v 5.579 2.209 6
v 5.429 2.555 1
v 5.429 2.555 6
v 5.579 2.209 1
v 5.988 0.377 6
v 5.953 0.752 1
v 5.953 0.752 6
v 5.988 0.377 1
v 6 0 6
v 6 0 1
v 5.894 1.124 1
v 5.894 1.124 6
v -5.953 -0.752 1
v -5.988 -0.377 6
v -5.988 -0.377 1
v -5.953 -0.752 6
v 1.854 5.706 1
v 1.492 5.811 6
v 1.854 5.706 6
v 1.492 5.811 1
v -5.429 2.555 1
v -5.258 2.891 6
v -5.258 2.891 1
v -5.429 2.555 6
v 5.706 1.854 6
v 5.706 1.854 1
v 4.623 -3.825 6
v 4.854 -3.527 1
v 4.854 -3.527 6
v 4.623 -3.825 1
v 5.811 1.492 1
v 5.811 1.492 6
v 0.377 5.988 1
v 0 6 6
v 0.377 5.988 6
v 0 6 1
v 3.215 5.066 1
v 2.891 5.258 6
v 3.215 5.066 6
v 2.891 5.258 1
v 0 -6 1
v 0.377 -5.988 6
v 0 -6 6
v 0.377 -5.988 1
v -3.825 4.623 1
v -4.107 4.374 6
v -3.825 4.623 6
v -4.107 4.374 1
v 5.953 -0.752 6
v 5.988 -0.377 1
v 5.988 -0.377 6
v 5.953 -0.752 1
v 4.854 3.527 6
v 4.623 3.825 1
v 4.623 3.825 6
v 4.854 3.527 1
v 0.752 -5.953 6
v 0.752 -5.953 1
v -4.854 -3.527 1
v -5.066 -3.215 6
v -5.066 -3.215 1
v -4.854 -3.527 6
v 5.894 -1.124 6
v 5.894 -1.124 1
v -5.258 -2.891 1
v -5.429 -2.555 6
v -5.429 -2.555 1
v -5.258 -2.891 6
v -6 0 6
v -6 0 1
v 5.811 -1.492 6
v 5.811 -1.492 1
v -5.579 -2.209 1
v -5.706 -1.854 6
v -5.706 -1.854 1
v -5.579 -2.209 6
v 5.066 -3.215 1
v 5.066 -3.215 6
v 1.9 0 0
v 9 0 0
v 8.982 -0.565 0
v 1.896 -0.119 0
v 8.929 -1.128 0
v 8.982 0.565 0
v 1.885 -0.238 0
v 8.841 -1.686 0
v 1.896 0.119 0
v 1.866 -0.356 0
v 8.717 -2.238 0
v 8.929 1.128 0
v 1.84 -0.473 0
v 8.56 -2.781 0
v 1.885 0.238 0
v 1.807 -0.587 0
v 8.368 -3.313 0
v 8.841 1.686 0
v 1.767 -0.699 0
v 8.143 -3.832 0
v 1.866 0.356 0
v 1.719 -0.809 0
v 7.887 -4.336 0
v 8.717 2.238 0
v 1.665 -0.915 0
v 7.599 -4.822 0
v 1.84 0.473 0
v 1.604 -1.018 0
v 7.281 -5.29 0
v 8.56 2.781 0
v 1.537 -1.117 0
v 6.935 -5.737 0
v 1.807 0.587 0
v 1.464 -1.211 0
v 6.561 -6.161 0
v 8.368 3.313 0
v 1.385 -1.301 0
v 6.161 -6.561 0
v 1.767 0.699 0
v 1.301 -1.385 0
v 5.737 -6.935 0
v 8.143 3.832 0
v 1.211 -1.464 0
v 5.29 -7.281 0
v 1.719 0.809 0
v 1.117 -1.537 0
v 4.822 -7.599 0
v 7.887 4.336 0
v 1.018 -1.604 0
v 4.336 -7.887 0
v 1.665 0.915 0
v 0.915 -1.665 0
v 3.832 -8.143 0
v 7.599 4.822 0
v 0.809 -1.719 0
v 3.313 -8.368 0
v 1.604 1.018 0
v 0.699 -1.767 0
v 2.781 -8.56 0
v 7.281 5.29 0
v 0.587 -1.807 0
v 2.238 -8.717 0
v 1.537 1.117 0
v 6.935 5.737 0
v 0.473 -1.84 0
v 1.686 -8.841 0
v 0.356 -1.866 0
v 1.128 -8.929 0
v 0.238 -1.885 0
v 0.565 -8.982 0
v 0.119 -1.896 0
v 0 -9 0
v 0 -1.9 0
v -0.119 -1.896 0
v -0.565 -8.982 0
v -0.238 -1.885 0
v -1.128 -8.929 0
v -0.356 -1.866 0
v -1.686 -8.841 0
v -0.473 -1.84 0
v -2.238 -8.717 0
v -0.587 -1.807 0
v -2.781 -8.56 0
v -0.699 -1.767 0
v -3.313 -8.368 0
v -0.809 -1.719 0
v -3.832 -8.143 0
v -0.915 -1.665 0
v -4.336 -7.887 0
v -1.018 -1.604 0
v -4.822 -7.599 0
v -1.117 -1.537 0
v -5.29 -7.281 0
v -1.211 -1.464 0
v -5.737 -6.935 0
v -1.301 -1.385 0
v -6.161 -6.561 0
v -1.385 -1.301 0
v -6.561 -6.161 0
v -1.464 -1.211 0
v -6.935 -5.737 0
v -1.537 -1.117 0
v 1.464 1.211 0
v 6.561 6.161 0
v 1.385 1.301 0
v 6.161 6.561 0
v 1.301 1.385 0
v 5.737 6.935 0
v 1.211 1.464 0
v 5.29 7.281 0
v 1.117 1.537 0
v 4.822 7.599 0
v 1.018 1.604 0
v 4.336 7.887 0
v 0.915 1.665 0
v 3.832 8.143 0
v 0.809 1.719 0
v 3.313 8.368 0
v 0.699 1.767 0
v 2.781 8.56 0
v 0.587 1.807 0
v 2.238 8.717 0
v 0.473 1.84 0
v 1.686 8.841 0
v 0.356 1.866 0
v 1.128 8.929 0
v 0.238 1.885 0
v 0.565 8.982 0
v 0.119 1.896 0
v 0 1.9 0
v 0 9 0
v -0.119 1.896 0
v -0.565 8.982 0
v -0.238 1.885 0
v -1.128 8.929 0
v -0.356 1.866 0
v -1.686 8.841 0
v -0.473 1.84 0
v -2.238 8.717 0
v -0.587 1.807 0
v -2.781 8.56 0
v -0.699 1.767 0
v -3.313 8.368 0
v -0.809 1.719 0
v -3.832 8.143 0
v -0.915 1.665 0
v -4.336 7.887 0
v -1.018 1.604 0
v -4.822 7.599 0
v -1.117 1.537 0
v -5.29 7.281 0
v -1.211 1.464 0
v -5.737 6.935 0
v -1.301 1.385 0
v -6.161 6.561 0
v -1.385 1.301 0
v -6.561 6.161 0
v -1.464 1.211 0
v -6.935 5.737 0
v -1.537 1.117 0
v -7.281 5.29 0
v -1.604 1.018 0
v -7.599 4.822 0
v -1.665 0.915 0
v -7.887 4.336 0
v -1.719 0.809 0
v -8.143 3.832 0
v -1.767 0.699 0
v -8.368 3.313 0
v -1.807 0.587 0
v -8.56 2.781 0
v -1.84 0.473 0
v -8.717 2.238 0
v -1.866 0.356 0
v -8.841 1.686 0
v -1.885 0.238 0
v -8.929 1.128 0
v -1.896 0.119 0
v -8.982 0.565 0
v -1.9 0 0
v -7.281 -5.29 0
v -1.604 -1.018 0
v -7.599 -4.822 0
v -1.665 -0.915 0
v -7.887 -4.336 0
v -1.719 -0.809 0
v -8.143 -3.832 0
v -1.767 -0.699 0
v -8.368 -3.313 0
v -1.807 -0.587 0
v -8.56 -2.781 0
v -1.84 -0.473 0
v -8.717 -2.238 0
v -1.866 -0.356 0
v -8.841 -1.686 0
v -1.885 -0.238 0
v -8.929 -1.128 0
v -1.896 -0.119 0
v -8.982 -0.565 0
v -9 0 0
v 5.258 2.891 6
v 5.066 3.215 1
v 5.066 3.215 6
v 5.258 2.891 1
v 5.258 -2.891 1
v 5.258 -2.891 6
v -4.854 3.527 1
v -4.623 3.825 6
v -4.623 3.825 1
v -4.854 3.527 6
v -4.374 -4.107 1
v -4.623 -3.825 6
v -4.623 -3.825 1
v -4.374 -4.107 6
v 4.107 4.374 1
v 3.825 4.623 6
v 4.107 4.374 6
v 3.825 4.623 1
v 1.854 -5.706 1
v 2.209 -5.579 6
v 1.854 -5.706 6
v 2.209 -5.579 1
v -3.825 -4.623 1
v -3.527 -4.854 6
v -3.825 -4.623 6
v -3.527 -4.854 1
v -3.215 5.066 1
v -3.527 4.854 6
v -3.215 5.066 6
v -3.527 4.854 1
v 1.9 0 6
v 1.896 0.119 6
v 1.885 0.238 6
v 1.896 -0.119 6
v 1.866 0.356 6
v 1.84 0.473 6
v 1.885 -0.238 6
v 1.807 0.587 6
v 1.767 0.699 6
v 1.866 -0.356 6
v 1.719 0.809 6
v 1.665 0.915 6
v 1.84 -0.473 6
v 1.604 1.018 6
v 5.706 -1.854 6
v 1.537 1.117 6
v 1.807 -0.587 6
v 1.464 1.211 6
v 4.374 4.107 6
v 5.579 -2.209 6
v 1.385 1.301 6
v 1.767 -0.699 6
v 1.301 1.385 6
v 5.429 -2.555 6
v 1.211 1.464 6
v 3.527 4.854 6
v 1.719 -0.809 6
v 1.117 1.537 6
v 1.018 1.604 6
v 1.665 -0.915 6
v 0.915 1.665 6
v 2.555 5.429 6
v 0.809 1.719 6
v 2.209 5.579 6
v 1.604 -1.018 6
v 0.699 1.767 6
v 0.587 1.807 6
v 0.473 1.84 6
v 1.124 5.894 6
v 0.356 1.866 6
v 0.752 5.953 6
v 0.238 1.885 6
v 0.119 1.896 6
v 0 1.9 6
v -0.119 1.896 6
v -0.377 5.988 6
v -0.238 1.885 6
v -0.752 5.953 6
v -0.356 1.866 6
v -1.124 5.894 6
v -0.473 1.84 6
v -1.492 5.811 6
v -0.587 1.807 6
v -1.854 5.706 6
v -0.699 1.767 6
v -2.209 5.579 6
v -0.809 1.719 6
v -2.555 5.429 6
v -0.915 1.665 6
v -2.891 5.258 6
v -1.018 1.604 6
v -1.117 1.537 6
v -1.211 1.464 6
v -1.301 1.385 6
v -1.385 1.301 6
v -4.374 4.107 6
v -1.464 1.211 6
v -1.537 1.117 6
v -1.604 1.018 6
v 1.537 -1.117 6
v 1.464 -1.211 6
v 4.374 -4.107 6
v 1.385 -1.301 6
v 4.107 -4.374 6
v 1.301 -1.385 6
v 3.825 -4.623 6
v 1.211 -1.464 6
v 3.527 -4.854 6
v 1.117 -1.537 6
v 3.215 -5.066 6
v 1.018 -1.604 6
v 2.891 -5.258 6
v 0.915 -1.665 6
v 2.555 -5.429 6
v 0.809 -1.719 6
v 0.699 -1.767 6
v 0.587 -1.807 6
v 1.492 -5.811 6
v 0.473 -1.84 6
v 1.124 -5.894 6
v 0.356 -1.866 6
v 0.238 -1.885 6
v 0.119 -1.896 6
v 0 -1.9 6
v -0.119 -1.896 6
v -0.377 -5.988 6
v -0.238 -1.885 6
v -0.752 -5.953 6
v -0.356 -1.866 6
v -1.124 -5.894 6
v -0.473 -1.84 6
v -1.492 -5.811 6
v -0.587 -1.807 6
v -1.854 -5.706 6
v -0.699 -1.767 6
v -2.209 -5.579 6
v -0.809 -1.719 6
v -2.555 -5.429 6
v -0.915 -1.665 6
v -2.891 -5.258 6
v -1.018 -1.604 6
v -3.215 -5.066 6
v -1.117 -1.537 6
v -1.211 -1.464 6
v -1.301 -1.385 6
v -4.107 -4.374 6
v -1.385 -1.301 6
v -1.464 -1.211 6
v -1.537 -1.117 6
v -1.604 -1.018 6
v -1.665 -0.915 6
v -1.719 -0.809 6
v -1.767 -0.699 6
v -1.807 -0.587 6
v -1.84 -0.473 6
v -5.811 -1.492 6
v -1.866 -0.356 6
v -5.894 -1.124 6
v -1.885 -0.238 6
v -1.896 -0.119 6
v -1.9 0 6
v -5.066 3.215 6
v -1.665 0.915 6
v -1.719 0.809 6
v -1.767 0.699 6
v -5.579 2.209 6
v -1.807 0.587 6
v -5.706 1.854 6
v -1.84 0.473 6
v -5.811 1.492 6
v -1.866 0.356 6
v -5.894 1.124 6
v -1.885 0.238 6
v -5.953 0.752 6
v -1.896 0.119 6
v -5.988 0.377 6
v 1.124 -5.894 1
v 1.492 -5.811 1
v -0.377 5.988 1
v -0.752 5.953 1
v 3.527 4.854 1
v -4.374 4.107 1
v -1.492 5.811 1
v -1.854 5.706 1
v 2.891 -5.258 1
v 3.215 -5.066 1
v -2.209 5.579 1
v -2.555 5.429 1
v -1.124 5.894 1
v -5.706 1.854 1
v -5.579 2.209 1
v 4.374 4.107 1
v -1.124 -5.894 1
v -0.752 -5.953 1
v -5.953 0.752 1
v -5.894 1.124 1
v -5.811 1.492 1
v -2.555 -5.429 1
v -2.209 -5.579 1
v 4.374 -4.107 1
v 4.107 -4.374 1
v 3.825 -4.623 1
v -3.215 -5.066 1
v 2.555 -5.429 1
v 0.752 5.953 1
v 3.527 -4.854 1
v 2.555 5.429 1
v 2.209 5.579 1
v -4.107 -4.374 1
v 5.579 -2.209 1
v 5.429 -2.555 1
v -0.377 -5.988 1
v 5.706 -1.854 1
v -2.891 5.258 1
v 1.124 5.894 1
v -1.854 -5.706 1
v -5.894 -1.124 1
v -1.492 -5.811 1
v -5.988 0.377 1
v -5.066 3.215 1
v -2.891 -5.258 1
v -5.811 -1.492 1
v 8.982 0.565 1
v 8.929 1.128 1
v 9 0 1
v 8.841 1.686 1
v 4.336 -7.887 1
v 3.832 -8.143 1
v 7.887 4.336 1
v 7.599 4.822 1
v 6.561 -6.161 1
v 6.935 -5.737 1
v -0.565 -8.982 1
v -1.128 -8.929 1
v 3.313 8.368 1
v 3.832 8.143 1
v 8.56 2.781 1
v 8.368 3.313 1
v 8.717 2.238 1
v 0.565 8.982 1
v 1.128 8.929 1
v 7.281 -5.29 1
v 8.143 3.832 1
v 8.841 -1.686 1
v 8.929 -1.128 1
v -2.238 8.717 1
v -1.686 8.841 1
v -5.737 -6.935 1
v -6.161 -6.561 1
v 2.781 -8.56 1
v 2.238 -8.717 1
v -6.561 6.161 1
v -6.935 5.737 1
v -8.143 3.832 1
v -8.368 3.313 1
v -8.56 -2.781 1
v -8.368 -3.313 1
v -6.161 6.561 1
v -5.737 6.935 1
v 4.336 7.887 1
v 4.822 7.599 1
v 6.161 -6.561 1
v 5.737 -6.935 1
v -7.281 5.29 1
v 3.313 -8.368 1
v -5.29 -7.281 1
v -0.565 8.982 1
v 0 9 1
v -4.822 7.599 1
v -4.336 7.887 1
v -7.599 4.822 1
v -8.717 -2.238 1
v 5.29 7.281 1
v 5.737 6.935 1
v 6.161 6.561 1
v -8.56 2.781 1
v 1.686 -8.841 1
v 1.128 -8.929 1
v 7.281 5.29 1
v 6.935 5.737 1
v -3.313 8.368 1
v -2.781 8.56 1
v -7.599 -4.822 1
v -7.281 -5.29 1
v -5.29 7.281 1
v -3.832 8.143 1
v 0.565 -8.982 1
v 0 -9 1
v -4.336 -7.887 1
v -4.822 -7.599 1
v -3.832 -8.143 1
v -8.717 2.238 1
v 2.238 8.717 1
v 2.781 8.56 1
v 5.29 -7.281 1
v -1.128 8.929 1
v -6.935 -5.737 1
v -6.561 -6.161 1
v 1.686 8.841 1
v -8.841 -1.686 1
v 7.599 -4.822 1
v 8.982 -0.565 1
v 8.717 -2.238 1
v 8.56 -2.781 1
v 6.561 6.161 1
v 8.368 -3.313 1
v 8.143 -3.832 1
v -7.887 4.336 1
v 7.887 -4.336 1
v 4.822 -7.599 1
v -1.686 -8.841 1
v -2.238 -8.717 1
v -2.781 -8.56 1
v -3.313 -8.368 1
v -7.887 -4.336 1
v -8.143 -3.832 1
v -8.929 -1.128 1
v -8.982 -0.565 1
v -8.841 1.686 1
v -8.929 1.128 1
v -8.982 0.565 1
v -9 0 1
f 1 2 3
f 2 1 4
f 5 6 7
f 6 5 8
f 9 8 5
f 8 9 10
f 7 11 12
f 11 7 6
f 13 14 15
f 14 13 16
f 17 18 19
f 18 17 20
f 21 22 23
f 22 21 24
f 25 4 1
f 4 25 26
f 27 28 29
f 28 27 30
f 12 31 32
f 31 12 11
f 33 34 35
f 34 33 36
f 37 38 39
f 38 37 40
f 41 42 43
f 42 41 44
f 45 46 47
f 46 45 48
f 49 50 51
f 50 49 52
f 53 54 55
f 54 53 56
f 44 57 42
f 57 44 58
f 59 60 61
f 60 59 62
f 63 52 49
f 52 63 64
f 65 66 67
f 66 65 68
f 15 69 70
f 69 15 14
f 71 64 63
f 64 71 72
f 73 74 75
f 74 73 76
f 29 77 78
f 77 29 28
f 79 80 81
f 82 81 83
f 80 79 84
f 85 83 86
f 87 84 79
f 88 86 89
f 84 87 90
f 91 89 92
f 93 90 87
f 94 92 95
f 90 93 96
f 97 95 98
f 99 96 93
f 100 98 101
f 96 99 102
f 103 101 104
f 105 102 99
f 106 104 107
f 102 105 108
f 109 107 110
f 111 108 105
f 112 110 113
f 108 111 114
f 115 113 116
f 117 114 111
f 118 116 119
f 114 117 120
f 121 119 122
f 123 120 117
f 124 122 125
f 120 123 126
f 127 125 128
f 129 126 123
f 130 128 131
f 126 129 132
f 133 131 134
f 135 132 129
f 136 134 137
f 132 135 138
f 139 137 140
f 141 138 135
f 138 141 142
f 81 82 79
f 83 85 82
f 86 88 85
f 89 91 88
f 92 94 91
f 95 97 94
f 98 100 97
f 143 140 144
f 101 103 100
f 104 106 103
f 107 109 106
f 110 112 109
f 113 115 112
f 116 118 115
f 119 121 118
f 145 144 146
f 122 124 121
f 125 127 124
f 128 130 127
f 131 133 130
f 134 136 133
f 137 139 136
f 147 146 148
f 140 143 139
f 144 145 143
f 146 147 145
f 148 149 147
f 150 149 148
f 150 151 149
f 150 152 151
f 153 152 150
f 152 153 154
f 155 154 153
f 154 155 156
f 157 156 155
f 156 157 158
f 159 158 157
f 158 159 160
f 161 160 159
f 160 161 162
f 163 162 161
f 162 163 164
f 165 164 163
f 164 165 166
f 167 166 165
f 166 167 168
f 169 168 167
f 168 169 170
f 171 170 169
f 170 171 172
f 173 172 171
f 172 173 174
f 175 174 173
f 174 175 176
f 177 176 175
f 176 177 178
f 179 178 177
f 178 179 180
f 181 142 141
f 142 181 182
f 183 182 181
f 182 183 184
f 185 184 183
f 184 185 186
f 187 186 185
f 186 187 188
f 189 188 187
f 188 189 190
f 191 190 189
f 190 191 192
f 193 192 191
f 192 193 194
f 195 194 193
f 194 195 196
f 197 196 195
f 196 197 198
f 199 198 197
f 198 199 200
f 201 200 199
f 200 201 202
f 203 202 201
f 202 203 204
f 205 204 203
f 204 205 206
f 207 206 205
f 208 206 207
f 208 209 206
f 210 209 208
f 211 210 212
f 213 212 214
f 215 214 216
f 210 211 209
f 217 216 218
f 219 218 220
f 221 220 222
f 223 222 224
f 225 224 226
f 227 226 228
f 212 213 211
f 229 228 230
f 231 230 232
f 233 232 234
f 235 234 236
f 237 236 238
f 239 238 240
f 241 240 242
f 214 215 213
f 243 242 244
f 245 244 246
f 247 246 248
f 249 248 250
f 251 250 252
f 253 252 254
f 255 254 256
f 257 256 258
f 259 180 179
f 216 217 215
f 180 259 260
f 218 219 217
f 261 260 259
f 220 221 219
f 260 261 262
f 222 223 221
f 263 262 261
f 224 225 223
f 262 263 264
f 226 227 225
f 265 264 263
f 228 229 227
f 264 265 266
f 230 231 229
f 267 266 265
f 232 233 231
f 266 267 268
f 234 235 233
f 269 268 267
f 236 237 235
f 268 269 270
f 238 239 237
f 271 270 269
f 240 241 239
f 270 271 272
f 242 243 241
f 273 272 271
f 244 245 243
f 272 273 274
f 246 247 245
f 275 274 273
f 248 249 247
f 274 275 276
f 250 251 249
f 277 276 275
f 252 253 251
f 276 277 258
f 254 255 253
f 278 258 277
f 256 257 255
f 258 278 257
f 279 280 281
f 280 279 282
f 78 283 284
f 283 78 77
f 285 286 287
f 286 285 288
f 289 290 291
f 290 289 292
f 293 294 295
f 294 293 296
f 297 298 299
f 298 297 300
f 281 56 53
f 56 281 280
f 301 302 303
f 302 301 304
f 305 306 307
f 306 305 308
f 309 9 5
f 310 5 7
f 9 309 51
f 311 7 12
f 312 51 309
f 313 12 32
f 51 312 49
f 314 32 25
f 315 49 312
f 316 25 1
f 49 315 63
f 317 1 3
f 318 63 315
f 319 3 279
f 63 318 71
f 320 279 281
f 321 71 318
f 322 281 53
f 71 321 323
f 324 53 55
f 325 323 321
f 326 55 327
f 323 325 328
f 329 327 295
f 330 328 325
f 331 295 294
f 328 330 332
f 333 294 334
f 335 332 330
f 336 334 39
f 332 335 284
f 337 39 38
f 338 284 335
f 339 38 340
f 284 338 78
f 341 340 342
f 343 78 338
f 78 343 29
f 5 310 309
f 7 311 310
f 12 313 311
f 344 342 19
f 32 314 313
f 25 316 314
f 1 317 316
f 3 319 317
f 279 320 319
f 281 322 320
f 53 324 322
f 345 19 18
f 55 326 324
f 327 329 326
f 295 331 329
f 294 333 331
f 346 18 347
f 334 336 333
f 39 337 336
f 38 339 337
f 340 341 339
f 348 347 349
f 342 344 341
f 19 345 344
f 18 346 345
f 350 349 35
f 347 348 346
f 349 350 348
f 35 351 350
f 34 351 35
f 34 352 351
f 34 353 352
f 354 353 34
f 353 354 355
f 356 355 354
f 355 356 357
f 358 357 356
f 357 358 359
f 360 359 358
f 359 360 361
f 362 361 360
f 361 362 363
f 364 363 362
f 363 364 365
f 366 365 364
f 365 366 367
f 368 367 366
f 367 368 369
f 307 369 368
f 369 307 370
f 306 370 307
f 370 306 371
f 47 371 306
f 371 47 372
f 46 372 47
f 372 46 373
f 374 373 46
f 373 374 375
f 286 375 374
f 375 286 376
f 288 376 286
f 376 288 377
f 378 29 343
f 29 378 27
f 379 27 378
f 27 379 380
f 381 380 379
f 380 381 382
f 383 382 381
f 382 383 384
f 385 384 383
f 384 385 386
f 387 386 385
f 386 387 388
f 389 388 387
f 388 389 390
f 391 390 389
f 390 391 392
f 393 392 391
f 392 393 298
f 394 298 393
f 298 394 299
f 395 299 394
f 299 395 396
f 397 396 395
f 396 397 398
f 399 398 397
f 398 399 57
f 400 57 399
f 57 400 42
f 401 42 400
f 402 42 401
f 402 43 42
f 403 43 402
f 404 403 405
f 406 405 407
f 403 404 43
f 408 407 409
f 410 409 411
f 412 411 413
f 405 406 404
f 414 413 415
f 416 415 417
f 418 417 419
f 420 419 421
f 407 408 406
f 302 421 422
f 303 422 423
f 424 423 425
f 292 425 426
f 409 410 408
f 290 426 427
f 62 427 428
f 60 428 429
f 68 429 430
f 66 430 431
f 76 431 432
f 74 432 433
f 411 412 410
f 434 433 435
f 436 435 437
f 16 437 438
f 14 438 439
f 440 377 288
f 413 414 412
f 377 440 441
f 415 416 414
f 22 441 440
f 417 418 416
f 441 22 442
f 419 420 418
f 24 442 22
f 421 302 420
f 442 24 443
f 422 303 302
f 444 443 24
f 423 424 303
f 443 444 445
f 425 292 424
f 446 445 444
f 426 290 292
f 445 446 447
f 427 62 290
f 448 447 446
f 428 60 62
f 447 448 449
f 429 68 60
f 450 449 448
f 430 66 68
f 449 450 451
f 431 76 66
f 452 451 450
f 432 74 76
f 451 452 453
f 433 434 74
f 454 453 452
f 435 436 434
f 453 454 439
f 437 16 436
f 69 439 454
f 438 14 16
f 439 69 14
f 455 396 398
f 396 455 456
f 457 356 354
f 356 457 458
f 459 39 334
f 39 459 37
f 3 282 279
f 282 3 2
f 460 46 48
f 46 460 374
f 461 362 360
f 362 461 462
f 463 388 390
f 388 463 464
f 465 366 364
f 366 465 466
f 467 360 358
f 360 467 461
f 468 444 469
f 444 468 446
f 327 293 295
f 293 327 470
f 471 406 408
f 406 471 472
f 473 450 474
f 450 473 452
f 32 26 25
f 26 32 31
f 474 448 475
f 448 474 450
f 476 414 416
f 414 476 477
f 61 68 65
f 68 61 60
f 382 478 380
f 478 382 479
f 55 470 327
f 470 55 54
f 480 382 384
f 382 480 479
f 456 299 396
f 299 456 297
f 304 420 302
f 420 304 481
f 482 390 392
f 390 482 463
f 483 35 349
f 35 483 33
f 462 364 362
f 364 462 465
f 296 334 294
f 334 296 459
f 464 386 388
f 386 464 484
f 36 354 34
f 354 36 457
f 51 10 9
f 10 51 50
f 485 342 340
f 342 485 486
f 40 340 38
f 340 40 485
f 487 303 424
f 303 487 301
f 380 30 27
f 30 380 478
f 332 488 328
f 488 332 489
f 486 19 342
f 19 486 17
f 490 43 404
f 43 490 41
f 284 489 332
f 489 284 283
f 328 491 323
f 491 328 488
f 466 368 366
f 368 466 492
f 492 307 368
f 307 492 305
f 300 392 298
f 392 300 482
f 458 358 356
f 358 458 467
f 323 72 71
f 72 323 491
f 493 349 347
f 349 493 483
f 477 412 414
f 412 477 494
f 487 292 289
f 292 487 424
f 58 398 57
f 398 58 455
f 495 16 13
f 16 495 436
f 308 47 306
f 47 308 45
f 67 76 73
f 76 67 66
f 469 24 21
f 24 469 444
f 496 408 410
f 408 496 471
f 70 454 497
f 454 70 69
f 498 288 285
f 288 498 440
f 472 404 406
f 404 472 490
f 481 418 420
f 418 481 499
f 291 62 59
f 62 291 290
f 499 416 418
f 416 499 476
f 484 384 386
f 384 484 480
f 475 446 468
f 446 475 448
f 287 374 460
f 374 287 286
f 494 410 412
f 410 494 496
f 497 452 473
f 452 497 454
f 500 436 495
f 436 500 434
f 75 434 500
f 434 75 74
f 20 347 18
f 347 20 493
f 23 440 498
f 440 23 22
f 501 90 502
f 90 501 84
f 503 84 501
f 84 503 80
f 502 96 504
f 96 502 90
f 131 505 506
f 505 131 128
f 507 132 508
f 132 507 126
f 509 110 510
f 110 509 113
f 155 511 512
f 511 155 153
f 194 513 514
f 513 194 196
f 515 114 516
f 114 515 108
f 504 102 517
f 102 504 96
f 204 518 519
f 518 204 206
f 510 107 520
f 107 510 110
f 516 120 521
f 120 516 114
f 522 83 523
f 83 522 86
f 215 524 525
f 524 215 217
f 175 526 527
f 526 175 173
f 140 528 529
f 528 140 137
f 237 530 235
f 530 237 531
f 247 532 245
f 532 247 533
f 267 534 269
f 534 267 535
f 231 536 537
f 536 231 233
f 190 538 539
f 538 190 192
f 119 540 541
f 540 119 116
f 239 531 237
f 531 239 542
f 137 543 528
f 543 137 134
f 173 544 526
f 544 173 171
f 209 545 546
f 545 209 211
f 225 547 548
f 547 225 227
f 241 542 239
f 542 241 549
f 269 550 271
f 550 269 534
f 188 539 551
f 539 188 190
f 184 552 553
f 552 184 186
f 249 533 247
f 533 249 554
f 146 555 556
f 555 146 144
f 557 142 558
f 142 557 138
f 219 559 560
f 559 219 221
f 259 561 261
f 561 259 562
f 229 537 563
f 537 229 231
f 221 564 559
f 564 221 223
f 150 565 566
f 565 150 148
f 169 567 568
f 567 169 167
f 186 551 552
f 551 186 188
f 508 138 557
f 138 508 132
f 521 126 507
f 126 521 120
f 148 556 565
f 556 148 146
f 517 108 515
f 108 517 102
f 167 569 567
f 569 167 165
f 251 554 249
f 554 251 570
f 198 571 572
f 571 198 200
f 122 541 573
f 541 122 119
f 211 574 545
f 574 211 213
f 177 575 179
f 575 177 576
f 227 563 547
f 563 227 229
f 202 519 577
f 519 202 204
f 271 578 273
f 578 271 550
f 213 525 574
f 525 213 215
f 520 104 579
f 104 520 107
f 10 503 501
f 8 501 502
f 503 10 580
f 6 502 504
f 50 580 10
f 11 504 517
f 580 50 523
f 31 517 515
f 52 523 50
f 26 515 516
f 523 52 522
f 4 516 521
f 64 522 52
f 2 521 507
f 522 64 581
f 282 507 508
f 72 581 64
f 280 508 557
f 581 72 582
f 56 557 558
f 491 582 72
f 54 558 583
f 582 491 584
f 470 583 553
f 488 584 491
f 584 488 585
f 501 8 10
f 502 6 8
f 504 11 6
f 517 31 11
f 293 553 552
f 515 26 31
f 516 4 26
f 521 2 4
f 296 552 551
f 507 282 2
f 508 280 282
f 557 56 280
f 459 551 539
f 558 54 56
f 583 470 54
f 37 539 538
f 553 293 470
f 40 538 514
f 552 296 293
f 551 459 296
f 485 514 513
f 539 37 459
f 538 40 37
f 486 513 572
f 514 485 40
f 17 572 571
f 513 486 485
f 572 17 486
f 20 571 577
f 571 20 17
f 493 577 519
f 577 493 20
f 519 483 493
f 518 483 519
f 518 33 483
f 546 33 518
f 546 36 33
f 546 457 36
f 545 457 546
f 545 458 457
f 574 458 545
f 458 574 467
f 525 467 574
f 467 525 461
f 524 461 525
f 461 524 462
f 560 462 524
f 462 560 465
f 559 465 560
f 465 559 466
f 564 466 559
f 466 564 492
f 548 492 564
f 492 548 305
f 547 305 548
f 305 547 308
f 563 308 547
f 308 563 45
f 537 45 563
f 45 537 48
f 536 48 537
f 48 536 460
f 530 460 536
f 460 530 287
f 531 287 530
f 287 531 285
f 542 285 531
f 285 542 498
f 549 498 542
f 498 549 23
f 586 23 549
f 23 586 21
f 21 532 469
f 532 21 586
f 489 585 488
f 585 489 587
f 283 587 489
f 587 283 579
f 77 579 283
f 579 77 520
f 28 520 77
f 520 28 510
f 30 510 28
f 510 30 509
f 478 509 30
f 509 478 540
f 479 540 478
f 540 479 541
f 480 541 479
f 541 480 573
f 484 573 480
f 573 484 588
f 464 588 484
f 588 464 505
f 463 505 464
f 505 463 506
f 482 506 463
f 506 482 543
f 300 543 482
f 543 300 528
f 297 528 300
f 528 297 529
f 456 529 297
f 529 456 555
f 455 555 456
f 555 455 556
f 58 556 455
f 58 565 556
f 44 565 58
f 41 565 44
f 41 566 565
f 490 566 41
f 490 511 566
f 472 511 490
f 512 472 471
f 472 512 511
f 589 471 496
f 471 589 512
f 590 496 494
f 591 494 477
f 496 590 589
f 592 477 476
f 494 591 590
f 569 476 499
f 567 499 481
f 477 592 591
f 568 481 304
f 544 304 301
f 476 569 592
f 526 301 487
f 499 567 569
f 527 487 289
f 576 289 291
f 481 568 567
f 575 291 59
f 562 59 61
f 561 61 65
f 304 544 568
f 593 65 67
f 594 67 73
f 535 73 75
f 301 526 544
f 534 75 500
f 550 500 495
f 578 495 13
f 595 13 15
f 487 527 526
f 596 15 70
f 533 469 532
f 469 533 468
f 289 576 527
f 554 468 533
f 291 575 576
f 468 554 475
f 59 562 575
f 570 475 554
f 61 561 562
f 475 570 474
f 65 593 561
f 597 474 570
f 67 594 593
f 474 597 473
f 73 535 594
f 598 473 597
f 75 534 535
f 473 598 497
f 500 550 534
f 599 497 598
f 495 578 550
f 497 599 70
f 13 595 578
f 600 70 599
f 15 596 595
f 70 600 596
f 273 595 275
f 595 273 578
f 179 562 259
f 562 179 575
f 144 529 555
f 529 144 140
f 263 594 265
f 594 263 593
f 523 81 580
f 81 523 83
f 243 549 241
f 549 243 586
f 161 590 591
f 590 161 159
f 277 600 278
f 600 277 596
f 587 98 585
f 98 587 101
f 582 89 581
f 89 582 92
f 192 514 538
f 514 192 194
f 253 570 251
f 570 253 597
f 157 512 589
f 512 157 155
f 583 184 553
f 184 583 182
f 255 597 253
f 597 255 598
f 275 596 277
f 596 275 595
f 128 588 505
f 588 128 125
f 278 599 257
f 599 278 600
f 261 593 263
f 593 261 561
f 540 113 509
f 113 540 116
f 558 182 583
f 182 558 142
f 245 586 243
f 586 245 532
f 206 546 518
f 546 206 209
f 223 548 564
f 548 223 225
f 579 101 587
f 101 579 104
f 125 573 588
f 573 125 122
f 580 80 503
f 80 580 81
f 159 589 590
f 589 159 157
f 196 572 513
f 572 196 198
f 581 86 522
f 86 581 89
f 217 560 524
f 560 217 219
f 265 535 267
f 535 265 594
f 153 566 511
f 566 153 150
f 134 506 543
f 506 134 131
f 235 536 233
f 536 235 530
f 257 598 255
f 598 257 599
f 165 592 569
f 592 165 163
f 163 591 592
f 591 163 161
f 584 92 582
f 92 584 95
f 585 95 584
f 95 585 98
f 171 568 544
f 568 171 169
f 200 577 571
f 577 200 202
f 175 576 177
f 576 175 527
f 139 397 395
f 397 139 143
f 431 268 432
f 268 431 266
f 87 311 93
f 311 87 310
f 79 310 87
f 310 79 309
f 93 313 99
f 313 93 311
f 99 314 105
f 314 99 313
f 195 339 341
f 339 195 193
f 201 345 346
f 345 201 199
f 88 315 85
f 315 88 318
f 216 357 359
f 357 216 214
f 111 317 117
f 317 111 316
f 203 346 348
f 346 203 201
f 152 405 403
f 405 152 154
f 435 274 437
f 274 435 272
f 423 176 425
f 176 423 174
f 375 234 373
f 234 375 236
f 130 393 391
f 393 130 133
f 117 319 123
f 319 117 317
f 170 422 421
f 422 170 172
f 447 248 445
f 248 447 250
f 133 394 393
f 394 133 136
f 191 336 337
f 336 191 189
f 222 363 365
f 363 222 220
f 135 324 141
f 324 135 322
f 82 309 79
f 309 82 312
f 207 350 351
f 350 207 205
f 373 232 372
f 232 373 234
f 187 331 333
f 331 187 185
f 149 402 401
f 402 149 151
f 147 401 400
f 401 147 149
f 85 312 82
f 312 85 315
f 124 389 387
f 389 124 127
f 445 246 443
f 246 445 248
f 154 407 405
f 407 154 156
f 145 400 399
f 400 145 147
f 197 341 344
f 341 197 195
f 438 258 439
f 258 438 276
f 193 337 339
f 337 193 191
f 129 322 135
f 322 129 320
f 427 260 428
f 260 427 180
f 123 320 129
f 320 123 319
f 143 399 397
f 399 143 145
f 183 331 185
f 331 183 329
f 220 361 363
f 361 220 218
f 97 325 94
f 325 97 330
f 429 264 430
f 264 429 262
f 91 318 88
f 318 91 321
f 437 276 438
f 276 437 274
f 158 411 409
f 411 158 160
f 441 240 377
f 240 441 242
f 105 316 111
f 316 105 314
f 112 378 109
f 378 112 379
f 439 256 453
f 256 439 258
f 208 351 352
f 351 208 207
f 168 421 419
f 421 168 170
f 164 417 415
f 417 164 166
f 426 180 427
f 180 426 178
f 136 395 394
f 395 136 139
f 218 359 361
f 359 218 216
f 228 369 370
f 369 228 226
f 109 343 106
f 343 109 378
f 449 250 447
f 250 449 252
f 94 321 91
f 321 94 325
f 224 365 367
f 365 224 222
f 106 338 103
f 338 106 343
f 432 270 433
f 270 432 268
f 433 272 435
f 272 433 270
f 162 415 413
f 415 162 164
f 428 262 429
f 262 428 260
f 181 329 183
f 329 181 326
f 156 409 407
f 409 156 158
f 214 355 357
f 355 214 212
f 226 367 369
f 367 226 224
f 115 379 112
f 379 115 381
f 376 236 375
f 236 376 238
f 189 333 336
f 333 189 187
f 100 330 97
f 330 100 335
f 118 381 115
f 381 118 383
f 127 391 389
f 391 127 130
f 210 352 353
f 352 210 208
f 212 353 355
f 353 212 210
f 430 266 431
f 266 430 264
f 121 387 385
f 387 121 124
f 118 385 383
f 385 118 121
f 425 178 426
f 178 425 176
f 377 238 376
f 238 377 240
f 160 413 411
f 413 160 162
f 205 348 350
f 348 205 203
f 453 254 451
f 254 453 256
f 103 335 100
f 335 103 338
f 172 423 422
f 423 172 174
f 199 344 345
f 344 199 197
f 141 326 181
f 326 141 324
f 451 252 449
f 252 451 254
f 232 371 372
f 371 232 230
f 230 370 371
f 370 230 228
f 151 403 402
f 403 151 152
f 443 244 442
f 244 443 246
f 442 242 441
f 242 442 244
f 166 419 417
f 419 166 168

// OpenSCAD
module ramp_top_connector(
        glass_thickness = 5,
        plate_thickness = 1,
        hole_diameter = 12,
        screw_diameter = 3.8) {
    difference() {
        union() {
            cylinder(d = hole_diameter, h = plate_thickness + glass_thickness, $fn = 100);
            cylinder(d = hole_diameter + 6, h = plate_thickness, $fn = 100);
        }
        translate([0, 0, -0.1]) {
            cylinder(d = screw_diameter, h = plate_thickness + glass_thickness + 1, $fn = 100);
        }
    }
}

ramp_top_connector();
